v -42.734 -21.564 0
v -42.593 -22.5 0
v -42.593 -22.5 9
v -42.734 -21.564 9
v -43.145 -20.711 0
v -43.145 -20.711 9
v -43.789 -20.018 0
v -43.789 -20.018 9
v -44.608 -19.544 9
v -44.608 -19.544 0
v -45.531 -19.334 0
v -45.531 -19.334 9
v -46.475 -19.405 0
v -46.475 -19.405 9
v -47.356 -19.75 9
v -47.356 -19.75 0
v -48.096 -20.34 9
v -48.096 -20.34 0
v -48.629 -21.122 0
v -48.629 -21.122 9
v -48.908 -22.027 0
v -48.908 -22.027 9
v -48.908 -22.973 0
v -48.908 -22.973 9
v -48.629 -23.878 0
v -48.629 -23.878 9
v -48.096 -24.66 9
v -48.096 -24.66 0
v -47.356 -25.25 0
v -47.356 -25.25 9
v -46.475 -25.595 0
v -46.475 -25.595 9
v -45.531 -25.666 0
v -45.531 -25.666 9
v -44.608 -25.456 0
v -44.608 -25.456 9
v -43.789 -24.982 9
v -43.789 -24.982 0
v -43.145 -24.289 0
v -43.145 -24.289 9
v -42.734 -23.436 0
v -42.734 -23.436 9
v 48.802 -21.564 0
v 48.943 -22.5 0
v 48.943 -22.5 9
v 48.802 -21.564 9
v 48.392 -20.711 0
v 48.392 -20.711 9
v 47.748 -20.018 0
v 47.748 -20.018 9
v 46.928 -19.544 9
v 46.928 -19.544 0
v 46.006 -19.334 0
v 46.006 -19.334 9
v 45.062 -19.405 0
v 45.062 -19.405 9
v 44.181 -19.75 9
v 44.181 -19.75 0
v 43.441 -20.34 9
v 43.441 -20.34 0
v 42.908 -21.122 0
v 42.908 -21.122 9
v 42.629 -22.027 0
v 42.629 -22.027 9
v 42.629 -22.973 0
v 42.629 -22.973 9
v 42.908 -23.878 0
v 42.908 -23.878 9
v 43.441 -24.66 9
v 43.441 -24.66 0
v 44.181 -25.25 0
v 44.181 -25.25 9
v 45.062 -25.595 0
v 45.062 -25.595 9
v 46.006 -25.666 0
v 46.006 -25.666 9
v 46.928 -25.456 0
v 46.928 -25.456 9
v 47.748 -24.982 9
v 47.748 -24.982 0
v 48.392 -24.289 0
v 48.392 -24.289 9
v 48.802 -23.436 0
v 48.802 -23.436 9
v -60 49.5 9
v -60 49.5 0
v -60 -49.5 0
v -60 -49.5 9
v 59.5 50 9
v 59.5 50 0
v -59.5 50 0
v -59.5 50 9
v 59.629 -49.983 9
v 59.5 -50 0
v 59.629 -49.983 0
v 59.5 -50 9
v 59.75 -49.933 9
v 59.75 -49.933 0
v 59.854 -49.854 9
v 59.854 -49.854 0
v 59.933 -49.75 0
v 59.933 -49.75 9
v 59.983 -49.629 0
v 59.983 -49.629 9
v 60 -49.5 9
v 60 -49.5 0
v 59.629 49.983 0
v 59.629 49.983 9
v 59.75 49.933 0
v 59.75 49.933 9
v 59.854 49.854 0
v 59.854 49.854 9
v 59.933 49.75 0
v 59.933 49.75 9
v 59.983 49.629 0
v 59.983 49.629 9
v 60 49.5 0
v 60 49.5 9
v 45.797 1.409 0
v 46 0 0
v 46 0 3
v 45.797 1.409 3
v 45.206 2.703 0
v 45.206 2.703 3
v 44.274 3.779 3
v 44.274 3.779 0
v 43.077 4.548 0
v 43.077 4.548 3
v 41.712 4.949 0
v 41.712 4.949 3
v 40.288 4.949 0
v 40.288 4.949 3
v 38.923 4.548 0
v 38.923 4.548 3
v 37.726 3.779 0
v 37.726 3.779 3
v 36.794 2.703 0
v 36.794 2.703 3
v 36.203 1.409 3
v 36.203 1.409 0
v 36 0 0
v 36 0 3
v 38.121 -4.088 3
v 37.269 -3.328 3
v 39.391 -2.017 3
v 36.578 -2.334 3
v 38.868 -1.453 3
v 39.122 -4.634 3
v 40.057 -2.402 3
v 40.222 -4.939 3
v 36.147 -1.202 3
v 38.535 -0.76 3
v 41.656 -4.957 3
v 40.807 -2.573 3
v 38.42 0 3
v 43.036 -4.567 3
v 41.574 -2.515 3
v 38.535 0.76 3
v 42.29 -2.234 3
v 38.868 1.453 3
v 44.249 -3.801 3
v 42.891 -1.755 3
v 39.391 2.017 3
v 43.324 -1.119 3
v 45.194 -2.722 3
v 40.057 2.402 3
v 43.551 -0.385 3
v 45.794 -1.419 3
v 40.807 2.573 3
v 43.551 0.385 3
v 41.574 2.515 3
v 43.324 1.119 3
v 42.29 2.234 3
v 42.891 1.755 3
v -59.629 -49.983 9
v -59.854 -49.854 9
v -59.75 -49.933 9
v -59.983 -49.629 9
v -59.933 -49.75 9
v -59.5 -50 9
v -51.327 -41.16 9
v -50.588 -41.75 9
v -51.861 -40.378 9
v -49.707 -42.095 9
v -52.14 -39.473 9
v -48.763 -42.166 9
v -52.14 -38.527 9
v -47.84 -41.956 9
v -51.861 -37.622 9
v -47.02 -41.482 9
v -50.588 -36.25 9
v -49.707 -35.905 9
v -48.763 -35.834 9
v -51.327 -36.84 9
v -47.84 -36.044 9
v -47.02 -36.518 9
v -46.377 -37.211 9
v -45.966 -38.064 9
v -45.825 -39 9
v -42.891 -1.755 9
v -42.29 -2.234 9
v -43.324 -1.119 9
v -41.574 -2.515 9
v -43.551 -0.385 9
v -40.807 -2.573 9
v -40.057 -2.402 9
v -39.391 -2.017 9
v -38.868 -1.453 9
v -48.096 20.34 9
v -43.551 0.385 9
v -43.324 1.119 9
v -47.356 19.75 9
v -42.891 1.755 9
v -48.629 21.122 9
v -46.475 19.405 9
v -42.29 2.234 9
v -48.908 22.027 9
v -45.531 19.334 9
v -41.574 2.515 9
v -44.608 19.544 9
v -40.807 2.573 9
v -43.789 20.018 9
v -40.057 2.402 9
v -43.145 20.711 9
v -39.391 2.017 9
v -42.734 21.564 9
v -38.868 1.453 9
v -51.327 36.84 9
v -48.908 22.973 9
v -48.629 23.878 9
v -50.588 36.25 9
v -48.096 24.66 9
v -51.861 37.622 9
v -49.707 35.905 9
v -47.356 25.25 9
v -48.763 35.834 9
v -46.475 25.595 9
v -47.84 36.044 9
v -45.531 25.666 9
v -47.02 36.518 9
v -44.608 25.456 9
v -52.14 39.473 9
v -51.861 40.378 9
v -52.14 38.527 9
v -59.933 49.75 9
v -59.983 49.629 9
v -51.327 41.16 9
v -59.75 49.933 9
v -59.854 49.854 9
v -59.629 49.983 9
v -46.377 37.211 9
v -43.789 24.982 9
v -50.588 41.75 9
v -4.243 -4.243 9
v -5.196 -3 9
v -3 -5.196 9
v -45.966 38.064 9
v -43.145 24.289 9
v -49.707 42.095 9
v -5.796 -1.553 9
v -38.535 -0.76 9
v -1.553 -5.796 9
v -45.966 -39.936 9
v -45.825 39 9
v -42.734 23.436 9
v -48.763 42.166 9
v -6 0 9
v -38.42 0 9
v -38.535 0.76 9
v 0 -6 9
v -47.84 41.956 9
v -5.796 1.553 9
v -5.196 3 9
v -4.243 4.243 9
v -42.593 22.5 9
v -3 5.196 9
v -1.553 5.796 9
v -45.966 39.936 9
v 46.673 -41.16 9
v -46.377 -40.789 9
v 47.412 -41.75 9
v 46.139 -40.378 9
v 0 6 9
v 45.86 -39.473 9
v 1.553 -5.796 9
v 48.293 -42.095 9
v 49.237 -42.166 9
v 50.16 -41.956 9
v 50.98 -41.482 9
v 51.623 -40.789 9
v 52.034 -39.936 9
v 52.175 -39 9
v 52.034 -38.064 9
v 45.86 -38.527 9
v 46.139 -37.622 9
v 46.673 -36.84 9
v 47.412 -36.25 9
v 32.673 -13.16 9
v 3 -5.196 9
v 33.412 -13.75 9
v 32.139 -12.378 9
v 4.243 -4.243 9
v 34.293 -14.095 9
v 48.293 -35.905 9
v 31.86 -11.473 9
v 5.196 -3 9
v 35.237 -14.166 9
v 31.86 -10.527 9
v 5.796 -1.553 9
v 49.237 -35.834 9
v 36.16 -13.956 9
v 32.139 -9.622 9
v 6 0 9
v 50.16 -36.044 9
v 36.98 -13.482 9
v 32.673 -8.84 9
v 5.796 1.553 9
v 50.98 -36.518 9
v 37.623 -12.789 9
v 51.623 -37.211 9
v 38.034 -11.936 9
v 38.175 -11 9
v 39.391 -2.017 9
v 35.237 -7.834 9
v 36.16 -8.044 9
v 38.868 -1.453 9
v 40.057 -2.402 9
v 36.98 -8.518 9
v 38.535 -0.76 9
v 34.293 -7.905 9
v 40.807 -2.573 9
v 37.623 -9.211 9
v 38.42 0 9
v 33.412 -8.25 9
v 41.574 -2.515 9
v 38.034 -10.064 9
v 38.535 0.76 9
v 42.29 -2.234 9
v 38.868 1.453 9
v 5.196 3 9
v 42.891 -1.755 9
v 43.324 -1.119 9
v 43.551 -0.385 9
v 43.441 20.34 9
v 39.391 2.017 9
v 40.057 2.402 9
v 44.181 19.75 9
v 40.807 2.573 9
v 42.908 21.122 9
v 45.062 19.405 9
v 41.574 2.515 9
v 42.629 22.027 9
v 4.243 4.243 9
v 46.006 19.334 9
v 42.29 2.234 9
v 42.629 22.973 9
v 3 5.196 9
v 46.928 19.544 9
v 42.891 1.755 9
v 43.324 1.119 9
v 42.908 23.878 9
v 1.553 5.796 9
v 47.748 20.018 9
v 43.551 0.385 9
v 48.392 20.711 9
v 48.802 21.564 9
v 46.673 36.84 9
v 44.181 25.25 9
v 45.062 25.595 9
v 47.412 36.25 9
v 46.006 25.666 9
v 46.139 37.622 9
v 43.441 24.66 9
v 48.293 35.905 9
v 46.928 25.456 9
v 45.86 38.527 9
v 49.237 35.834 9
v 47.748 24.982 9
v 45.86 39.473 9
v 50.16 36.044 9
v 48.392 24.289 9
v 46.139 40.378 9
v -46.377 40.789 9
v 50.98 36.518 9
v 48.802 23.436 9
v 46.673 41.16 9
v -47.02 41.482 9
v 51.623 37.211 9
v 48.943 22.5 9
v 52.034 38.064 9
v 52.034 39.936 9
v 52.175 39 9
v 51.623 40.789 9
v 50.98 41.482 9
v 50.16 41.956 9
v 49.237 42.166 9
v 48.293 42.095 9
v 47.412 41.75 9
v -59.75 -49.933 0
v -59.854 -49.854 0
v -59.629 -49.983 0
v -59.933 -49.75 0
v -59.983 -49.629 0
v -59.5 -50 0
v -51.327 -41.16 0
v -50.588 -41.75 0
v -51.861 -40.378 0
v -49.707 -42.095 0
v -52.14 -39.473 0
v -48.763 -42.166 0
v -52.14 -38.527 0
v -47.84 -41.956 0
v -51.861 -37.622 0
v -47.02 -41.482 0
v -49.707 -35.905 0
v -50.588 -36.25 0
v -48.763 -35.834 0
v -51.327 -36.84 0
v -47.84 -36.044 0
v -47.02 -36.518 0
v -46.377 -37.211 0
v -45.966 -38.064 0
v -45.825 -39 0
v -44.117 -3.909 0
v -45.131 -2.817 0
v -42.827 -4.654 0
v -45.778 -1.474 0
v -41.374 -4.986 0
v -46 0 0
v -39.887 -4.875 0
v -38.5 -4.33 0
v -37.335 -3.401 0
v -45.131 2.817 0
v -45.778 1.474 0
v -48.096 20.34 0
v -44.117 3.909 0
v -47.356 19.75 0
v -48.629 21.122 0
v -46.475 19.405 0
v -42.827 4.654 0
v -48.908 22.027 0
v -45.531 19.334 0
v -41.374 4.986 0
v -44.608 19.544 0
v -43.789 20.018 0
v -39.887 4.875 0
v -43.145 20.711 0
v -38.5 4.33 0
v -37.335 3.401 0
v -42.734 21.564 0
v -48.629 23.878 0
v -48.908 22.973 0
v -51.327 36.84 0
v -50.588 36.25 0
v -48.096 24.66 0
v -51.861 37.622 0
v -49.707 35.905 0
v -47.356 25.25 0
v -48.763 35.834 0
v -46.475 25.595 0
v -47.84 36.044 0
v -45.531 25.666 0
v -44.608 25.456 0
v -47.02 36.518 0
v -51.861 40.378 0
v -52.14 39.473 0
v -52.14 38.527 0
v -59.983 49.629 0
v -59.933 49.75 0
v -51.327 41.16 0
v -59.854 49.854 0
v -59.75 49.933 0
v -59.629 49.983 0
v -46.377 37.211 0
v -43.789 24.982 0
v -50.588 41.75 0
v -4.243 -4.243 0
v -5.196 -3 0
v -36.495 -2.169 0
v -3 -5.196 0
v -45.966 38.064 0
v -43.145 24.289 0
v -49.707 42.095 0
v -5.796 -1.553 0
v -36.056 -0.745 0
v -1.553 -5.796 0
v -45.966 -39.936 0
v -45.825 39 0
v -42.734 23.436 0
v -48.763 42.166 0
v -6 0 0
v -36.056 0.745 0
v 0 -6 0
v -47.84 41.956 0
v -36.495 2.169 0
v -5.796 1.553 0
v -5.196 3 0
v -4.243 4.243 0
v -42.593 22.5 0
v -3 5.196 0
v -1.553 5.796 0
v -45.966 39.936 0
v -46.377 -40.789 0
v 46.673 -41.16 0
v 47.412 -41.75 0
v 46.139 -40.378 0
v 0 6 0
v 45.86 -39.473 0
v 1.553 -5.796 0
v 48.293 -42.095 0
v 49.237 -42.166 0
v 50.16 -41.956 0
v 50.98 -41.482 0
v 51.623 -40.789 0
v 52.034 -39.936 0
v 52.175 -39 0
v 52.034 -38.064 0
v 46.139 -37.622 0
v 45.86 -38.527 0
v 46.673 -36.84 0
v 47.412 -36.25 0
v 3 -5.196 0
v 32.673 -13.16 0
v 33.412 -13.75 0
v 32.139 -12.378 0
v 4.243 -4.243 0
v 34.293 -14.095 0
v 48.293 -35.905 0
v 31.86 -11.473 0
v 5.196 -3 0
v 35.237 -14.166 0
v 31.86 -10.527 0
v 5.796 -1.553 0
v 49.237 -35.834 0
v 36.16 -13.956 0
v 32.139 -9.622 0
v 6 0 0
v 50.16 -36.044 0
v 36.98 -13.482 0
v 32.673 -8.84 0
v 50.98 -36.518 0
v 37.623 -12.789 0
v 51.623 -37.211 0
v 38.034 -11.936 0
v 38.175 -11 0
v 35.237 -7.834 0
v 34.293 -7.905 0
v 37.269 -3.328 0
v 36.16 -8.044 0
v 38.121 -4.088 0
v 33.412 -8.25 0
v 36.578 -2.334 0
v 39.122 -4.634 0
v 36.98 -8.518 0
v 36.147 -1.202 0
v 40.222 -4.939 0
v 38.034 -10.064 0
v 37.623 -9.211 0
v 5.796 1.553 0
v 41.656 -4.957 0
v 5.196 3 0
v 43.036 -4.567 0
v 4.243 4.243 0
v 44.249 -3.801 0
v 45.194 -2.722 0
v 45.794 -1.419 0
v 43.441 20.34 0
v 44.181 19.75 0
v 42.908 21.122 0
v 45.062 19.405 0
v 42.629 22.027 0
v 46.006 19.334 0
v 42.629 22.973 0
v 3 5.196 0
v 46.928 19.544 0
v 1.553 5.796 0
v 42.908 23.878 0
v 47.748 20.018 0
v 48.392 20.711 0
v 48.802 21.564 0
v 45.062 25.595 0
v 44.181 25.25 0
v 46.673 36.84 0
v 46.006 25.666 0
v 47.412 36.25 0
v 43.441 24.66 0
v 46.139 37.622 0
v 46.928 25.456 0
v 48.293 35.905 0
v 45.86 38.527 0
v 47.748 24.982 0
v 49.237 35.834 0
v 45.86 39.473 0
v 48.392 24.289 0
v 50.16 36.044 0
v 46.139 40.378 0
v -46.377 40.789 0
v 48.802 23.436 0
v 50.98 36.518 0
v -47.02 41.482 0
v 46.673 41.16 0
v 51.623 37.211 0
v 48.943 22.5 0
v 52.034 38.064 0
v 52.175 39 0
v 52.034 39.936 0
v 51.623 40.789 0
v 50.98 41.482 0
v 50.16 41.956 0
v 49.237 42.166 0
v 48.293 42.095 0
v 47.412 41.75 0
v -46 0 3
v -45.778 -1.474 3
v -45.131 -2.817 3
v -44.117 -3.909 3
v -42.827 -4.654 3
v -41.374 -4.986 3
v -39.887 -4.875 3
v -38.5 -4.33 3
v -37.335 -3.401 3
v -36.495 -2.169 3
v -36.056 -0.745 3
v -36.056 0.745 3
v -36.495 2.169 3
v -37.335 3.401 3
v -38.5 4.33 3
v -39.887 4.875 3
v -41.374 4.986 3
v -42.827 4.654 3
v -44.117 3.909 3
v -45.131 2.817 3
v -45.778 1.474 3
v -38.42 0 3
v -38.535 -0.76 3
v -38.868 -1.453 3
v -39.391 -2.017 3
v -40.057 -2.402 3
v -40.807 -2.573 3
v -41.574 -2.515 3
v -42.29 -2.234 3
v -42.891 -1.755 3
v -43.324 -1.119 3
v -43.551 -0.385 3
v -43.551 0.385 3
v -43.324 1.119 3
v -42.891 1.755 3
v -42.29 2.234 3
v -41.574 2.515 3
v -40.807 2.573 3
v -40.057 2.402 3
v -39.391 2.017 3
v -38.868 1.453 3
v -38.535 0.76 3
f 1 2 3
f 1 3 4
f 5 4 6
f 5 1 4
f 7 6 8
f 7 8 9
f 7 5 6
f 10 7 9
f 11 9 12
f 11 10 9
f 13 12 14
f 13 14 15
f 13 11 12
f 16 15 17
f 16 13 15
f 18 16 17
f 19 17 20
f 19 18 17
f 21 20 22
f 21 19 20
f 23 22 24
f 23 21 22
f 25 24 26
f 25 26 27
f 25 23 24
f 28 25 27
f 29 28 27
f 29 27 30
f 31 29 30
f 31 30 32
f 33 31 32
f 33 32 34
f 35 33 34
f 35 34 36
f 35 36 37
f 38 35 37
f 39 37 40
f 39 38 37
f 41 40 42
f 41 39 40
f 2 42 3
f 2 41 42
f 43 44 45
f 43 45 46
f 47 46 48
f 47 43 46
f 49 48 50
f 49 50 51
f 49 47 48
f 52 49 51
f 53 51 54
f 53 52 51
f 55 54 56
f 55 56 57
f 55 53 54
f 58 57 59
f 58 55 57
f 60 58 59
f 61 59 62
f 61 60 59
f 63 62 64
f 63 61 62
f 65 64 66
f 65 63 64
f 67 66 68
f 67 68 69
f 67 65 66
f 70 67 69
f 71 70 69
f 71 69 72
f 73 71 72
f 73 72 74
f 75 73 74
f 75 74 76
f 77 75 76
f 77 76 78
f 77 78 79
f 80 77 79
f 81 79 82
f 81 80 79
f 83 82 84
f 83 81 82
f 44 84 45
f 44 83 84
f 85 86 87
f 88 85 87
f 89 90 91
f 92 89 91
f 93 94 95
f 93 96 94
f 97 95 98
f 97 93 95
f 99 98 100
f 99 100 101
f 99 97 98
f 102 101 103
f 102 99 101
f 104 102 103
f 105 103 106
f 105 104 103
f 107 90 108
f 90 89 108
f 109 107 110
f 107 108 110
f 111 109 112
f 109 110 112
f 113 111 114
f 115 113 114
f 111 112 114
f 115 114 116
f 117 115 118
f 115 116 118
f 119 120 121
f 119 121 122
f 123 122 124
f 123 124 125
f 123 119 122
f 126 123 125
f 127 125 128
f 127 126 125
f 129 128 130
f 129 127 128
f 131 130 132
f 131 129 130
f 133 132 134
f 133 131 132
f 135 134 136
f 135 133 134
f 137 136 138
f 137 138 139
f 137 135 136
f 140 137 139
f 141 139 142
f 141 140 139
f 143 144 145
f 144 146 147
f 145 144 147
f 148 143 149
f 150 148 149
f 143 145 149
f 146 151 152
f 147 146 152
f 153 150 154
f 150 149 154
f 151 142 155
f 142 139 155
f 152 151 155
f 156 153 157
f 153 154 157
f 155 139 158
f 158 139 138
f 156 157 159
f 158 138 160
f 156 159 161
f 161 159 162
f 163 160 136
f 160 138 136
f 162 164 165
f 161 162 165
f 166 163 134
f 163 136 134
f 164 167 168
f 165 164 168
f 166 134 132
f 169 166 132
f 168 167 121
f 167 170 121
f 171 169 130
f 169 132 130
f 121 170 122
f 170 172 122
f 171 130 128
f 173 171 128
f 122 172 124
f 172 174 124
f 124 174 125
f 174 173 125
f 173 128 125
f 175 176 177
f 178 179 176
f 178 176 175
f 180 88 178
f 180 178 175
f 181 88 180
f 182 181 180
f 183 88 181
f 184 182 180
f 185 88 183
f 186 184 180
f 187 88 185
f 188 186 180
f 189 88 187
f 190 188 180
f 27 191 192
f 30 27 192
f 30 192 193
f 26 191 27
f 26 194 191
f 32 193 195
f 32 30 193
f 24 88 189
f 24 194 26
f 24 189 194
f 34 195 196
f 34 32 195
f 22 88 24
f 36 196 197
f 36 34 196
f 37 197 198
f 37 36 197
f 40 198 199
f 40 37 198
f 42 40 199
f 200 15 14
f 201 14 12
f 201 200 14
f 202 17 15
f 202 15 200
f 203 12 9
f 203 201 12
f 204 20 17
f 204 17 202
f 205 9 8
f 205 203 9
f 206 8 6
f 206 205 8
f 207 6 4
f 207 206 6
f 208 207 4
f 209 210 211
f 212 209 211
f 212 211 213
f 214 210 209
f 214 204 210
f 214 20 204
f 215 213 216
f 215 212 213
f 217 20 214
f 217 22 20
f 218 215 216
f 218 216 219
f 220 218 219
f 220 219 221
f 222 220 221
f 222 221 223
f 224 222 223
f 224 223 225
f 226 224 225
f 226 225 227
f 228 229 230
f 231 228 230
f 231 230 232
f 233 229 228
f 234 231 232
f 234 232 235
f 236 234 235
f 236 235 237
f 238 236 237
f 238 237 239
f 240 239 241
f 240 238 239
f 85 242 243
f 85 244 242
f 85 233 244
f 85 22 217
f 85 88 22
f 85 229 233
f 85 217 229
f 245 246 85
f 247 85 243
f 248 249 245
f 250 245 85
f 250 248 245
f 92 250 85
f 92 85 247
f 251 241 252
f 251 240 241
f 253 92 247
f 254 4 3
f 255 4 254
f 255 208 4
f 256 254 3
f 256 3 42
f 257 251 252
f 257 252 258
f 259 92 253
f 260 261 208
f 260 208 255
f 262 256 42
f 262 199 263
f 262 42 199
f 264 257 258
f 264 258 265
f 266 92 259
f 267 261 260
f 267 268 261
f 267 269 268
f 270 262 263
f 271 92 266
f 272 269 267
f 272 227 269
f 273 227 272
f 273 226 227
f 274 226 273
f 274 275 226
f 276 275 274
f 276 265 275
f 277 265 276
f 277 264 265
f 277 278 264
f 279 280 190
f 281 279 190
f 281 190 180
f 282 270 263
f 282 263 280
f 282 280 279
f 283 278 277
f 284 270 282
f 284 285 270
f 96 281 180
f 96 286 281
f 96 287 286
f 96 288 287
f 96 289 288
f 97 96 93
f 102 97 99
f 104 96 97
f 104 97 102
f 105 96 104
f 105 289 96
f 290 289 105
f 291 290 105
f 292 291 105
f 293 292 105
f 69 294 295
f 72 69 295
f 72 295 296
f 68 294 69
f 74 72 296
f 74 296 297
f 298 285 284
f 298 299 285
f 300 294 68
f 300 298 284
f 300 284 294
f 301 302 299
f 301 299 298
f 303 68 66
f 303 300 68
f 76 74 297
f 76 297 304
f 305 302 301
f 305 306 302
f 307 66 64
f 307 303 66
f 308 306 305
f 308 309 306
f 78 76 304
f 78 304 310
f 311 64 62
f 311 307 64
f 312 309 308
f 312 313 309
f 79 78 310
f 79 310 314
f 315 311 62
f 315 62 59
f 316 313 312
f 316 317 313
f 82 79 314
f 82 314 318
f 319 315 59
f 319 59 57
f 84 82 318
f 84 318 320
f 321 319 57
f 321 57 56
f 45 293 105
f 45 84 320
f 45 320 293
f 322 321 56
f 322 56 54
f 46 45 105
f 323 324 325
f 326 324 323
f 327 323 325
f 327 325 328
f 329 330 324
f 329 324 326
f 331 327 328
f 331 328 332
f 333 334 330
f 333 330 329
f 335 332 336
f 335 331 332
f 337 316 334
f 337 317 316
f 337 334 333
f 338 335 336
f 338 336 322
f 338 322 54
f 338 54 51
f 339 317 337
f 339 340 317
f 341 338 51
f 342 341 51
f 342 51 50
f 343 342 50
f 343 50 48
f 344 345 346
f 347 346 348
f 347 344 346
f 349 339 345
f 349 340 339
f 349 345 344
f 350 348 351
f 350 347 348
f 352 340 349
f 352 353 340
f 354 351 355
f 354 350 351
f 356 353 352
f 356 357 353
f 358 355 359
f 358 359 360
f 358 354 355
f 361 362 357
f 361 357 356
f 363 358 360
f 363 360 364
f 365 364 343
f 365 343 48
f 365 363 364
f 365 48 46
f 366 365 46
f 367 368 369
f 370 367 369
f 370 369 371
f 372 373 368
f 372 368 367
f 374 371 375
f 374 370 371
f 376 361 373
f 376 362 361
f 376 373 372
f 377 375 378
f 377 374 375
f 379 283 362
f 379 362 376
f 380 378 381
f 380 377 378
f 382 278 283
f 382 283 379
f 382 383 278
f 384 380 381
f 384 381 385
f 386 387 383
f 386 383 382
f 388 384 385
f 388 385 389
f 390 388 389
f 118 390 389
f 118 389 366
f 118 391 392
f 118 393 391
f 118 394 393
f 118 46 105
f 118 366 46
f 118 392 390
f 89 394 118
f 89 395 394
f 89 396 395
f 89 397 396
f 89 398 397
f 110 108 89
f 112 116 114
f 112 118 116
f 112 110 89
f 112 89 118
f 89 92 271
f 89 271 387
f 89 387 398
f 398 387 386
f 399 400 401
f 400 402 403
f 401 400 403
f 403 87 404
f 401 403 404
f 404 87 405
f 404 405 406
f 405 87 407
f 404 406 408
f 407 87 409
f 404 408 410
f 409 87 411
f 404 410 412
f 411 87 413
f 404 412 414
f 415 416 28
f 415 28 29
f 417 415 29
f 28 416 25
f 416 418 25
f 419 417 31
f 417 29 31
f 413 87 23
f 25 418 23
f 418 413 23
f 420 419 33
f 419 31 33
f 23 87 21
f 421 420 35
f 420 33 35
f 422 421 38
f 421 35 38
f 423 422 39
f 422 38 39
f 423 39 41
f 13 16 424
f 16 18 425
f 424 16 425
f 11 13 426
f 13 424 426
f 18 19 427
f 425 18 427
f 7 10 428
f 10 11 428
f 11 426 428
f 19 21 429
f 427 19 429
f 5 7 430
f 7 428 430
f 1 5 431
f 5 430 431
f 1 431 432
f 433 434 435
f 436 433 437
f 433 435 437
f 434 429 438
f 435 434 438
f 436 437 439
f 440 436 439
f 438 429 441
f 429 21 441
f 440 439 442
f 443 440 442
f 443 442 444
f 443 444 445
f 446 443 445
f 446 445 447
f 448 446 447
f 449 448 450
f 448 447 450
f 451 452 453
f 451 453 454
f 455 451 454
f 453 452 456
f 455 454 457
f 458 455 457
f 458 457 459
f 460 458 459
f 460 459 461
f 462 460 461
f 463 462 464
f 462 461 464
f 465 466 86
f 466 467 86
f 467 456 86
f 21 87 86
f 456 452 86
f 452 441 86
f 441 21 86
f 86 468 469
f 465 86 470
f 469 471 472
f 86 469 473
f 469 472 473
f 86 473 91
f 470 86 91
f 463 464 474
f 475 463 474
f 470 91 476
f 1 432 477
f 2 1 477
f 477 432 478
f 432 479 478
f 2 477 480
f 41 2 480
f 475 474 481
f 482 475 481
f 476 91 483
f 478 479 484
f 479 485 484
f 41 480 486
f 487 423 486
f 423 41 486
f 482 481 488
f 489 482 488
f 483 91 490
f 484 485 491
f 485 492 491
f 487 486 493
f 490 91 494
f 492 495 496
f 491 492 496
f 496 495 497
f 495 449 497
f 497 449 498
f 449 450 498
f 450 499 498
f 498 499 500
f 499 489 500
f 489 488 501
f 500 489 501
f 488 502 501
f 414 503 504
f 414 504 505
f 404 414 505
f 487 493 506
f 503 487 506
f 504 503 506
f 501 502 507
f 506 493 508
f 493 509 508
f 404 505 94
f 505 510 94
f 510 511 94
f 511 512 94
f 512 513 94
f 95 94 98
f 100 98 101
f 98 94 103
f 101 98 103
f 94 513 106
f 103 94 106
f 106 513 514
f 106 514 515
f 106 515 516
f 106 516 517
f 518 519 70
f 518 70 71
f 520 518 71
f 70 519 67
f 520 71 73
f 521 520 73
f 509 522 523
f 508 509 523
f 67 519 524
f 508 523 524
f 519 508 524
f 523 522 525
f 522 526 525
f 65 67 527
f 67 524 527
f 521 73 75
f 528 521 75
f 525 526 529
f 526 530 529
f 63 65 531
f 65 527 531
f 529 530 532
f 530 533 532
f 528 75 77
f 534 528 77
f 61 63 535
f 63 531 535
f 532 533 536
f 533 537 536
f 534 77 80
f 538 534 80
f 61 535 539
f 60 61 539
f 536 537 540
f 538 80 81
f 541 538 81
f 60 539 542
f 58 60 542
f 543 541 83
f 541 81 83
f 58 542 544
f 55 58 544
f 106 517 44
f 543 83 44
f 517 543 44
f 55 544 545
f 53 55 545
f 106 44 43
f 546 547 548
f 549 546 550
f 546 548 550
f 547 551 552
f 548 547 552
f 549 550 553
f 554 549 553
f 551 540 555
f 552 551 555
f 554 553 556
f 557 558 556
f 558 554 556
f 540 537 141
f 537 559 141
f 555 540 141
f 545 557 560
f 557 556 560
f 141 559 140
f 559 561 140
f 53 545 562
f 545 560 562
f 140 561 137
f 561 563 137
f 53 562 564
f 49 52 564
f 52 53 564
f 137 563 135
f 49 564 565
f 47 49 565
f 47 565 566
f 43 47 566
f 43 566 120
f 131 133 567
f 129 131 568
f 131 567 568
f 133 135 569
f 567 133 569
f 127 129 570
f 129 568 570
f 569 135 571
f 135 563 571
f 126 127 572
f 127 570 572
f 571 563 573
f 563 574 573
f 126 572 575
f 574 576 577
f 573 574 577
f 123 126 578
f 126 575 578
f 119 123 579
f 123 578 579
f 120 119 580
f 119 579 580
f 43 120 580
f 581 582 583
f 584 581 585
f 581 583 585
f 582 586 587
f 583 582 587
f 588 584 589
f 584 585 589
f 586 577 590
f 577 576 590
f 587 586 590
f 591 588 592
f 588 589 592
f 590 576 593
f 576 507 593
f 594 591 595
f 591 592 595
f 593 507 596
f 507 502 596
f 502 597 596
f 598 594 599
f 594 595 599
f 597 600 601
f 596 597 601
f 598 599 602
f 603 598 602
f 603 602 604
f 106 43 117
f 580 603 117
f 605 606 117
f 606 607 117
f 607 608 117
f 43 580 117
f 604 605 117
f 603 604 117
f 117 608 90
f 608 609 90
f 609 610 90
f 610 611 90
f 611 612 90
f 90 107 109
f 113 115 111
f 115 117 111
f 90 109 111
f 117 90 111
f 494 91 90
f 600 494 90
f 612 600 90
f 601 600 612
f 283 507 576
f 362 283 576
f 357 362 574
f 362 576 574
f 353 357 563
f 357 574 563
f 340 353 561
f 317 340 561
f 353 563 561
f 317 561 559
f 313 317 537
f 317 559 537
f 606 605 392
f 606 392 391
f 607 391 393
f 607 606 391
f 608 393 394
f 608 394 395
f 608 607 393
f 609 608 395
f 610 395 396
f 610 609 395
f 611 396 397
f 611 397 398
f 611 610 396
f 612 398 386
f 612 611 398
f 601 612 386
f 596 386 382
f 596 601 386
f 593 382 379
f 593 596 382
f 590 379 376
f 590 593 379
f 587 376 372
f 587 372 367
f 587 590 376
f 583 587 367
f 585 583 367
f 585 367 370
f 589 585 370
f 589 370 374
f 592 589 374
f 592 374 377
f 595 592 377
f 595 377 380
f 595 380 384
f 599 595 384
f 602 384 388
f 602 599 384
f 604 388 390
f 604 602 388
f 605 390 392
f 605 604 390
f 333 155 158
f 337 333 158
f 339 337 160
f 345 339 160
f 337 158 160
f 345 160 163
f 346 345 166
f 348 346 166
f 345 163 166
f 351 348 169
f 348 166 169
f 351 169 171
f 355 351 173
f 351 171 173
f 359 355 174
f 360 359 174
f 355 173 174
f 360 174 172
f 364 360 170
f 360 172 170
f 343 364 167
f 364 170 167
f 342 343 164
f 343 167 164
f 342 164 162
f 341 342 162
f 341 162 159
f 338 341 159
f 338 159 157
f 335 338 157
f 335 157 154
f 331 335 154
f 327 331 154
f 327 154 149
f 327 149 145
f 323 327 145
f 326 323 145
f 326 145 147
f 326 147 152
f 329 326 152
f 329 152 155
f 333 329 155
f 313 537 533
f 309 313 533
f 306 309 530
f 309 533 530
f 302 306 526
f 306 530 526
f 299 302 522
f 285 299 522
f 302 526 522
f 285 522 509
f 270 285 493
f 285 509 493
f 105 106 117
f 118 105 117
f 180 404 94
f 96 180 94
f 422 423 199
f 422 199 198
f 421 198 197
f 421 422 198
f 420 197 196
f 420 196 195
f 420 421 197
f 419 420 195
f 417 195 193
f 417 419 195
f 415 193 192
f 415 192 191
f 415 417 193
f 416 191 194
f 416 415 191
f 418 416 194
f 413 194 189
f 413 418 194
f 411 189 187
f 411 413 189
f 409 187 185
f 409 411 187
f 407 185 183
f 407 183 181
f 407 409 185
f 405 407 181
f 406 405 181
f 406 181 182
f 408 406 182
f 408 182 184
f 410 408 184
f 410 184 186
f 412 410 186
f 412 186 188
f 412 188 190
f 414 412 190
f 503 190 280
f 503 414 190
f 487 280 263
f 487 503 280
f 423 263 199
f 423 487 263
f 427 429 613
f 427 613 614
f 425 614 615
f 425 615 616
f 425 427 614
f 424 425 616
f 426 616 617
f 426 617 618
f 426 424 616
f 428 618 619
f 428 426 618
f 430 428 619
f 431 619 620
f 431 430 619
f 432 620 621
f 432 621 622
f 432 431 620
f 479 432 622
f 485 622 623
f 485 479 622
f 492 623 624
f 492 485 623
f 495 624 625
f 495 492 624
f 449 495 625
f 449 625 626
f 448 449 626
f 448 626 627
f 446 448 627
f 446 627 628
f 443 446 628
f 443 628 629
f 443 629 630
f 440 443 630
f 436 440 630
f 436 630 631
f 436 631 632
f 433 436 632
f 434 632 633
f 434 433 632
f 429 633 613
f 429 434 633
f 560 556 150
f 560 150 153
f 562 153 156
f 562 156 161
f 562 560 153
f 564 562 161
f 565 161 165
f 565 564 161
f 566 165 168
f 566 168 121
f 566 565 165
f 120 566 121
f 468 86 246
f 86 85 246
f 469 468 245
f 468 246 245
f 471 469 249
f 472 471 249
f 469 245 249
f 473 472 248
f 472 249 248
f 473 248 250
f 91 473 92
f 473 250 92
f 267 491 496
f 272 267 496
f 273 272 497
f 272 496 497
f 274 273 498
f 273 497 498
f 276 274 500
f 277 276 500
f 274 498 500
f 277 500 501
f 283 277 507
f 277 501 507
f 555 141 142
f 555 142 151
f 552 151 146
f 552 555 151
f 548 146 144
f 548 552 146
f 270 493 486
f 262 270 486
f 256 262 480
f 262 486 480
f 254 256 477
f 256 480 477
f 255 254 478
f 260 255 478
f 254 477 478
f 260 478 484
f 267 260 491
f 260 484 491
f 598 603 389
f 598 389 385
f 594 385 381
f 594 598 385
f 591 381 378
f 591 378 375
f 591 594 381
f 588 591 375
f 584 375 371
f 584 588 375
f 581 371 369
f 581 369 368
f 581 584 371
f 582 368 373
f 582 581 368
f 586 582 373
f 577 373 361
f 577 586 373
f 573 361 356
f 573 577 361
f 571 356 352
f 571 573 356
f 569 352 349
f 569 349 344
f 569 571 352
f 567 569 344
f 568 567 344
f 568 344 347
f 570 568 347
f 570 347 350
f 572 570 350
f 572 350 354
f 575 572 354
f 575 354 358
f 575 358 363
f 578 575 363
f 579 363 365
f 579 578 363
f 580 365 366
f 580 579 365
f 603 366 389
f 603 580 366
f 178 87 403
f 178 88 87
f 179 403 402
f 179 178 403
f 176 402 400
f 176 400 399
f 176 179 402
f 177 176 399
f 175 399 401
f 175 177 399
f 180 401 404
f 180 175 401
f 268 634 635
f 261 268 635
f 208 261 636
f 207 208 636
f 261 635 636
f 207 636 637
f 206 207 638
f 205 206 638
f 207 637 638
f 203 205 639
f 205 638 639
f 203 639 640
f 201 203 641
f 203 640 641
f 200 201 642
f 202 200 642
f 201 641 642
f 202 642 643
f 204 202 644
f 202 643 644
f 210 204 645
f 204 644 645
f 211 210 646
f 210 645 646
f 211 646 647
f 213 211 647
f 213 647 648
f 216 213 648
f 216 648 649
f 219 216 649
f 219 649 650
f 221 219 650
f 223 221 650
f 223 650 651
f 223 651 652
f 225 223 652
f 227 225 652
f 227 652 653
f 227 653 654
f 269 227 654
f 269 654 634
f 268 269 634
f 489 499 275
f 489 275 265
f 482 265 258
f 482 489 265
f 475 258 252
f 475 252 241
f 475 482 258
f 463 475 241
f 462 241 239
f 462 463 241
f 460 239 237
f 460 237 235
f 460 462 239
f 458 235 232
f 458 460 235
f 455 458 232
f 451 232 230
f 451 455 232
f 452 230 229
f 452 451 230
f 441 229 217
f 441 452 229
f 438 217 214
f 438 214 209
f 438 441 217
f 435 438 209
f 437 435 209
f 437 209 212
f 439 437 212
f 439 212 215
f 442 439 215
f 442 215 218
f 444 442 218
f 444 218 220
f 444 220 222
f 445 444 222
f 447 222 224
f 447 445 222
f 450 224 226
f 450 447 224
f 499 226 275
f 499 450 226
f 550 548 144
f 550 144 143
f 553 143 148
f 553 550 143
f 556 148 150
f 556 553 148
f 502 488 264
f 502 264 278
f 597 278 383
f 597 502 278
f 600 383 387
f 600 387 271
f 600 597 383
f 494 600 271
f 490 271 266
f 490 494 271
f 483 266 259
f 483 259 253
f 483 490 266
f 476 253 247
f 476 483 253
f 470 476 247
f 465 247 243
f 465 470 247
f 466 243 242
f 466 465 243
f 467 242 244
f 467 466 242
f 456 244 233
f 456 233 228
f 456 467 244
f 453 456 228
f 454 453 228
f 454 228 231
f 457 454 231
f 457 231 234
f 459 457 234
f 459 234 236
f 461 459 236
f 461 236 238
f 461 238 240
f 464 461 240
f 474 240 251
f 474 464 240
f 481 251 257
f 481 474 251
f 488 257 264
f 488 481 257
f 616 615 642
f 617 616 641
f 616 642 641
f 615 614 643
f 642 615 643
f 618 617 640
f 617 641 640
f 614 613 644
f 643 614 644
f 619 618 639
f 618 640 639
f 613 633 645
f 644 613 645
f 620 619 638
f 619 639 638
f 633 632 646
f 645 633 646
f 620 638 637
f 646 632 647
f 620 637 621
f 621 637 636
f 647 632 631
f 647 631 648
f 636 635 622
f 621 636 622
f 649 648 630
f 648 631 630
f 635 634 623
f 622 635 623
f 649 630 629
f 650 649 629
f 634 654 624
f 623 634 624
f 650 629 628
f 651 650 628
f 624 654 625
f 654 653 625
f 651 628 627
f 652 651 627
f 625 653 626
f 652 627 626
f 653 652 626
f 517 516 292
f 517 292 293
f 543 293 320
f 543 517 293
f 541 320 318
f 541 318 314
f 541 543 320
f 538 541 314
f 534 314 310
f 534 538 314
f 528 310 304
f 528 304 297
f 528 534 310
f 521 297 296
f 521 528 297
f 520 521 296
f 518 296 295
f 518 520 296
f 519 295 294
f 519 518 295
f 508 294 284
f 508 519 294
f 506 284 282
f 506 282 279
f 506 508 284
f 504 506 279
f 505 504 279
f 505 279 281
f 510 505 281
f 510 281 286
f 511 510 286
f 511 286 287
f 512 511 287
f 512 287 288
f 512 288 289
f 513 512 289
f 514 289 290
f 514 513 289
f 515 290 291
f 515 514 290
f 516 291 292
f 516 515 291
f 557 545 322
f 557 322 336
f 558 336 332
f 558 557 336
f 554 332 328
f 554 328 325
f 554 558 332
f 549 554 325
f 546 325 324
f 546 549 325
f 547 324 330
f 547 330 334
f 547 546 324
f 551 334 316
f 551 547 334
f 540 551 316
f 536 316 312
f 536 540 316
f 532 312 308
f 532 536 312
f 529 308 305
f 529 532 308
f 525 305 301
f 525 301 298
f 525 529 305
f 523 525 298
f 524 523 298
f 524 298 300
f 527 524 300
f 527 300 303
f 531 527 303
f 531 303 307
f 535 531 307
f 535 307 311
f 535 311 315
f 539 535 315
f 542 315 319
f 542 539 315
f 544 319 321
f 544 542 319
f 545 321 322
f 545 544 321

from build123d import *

# Parameters (mm, degrees)
F0_R     = 3.175
F1_DEPTH = 9
F2_DEPTH = 3
F4_R     = 0.5


with BuildPart() as f1:
    # F0 (on Top) → F1 (new body)
    with BuildSketch(Plane.XY):
        with BuildLine():
            Line((0, 17.5), (0, 50))
            Line((0, 50), (-60, 50))
            Line((-60, 50), (-60, 0))
            Line((-60, 0), (-46, 0))
            ThreePointArc((-46, 0), (-41, 5), (-36, 0))
            Line((-36, 0), (-17.5, 0))
            ThreePointArc((-17.5, 0), (-12.3743686708, 12.3743686708), (0, 17.5))
        make_face()
        with Locations((-45.768439, 22.5)):
            Circle(F0_R, mode=Mode.SUBTRACT)
        with Locations((-49, 39)):
            Circle(F0_R, mode=Mode.SUBTRACT)
        with BuildLine():
            Line((60, 50), (0, 50))
            Line((0, 50), (0, 17.5))
            ThreePointArc((0, 17.5), (12.3743686708, 12.3743686708), (17.5, 0))
            Line((17.5, 0), (36, 0))
            ThreePointArc((36, 0), (41, 5), (46, 0))
            Line((46, 0), (60, 0))
            Line((60, 0), (60, 50))
        make_face()
        with Locations((45.768439, 22.5)):
            Circle(F0_R, mode=Mode.SUBTRACT)
        with Locations((49, 39)):
            Circle(F0_R, mode=Mode.SUBTRACT)
        with BuildLine():
            Line((36, 0), (17.5, 0))
            ThreePointArc((17.5, 0), (12.3743686708, -12.3743686708), (0, -17.5))
            Line((0, -17.5), (0, -50))
            Line((0, -50), (60, -50))
            Line((60, -50), (60, 0))
            Line((60, 0), (46, 0))
            ThreePointArc((46, 0), (44.2486753365, -3.8008036726), (40.2215565768, -4.9390308601))
            ThreePointArc((40.2215565768, -4.9390308601), (42.2722916819, -7.6662673034), (43, -11))
            ThreePointArc((43, -11), (28.5909784575, -15.7879476676), (37.268889283, -3.3284850635))
            ThreePointArc((37.268889283, -3.3284850635), (36.3279793673, -1.7810736109), (36, 0))
        make_face()
        with Locations((49, -39)):
            Circle(F0_R, mode=Mode.SUBTRACT)
        with Locations((45.768439, -22.5)):
            Circle(F0_R, mode=Mode.SUBTRACT)
        with BuildLine():
            ThreePointArc((0, -17.5), (-12.3743686708, -12.3743686708), (-17.5, 0))
            Line((-17.5, 0), (-36, 0))
            ThreePointArc((-36, 0), (-41, -5), (-46, 0))
            Line((-46, 0), (-60, 0))
            Line((-60, 0), (-60, -50))
            Line((-60, -50), (0, -50))
            Line((0, -50), (0, -17.5))
        make_face()
        with Locations((-49, -39)):
            Circle(F0_R, mode=Mode.SUBTRACT)
        with Locations((-45.768439, -22.5)):
            Circle(F0_R, mode=Mode.SUBTRACT)
        with BuildLine():
            ThreePointArc((40.2215565768, -4.9390308601), (38.6057393466, -4.3894778646), (37.268889283, -3.3284850635))
            ThreePointArc((37.268889283, -3.3284850635), (28.5909784575, -15.7879476676), (43, -11))
            ThreePointArc((43, -11), (42.2722916819, -7.6662673034), (40.2215565768, -4.9390308601))
        make_face()
        with Locations((35, -11)):
            Circle(F0_R, mode=Mode.SUBTRACT)
        with BuildLine():
            Line((38.42, 0), (36, 0))
            ThreePointArc((36, 0), (36.3279793673, -1.7810736109), (37.268889283, -3.3284850635))
            ThreePointArc((37.268889283, -3.3284850635), (38.8308170454, -3.9768354167), (40.2215565768, -4.9390308601))
            ThreePointArc((40.2215565768, -4.9390308601), (44.2486753365, -3.8008036726), (46, 0))
            Line((46, 0), (43.58, 0))
            ThreePointArc((43.58, 0), (41, -2.58), (38.42, 0))
        make_face()
        with BuildLine():
            ThreePointArc((46, 0), (41, 5), (36, 0))
            Line((36, 0), (38.42, 0))
            ThreePointArc((38.42, 0), (41, 2.58), (43.58, 0))
            Line((43.58, 0), (46, 0))
        make_face()
        with BuildLine():
            Line((-38.42, 0), (-36, 0))
            ThreePointArc((-36, 0), (-41, 5), (-46, 0))
            Line((-46, 0), (-43.58, 0))
            ThreePointArc((-43.58, 0), (-41, 2.58), (-38.42, 0))
        make_face()
        with BuildLine():
            ThreePointArc((-46, 0), (-41, -5), (-36, 0))
            Line((-36, 0), (-38.42, 0))
            ThreePointArc((-38.42, 0), (-41, -2.58), (-43.58, 0))
            Line((-43.58, 0), (-46, 0))
        make_face()
        with BuildLine():
            ThreePointArc((40.2215565768, -4.9390308601), (38.8308170454, -3.9768354167), (37.268889283, -3.3284850635))
            ThreePointArc((37.268889283, -3.3284850635), (38.6057393466, -4.3894778646), (40.2215565768, -4.9390308601))
        make_face()
        with BuildLine():
            Line((0, 6), (0, 17.5))
            ThreePointArc((0, 17.5), (-12.3743686708, 12.3743686708), (-17.5, 0))
            Line((-17.5, 0), (-6, 0))
            ThreePointArc((-6, 0), (-4.2426406871, 4.2426406871), (0, 6))
        make_face()
        with BuildLine():
            ThreePointArc((17.5, 0), (12.3743686708, 12.3743686708), (0, 17.5))
            Line((0, 17.5), (0, 6))
            ThreePointArc((0, 6), (4.2426406871, 4.2426406871), (6, 0))
            Line((6, 0), (17.5, 0))
        make_face()
        with BuildLine():
            ThreePointArc((0, -17.5), (12.3743686708, -12.3743686708), (17.5, 0))
            Line((17.5, 0), (6, 0))
            ThreePointArc((6, 0), (4.2426406871, -4.2426406871), (0, -6))
            Line((0, -6), (0, -17.5))
        make_face()
        with BuildLine():
            Line((-6, 0), (-17.5, 0))
            ThreePointArc((-17.5, 0), (-12.3743686708, -12.3743686708), (0, -17.5))
            Line((0, -17.5), (0, -6))
            ThreePointArc((0, -6), (-4.2426406871, -4.2426406871), (-6, 0))
        make_face()
    extrude(amount=F1_DEPTH)


with BuildPart() as f2:
    # F0 (on Top) → F2 (new body)
    with BuildSketch(Plane.XY):
        with BuildLine():
            Line((38.42, 0), (36, 0))
            ThreePointArc((36, 0), (36.3279793673, -1.7810736109), (37.268889283, -3.3284850635))
            ThreePointArc((37.268889283, -3.3284850635), (38.8308170454, -3.9768354167), (40.2215565768, -4.9390308601))
            ThreePointArc((40.2215565768, -4.9390308601), (44.2486753365, -3.8008036726), (46, 0))
            Line((46, 0), (43.58, 0))
            ThreePointArc((43.58, 0), (41, -2.58), (38.42, 0))
        make_face()
        with BuildLine():
            ThreePointArc((46, 0), (41, 5), (36, 0))
            Line((36, 0), (38.42, 0))
            ThreePointArc((38.42, 0), (41, 2.58), (43.58, 0))
            Line((43.58, 0), (46, 0))
        make_face()
        with BuildLine():
            ThreePointArc((40.2215565768, -4.9390308601), (38.8308170454, -3.9768354167), (37.268889283, -3.3284850635))
            ThreePointArc((37.268889283, -3.3284850635), (38.6057393466, -4.3894778646), (40.2215565768, -4.9390308601))
        make_face()
    extrude(amount=F2_DEPTH)


with BuildPart() as f2b:
    # F0 (on Top) → F2, piece 2 (new body)
    with BuildSketch(Plane.XY):
        with BuildLine():
            Line((-38.42, 0), (-36, 0))
            ThreePointArc((-36, 0), (-41, 5), (-46, 0))
            Line((-46, 0), (-43.58, 0))
            ThreePointArc((-43.58, 0), (-41, 2.58), (-38.42, 0))
        make_face()
        with BuildLine():
            ThreePointArc((-46, 0), (-41, -5), (-36, 0))
            Line((-36, 0), (-38.42, 0))
            ThreePointArc((-38.42, 0), (-41, -2.58), (-43.58, 0))
            Line((-43.58, 0), (-46, 0))
        make_face()
    extrude(amount=F2_DEPTH)


with BuildPart() as f1_1:
    add(f1.part)

    # F3: cut F2b, F2
    add(f2b.part, mode=Mode.SUBTRACT)
    add(f2.part, mode=Mode.SUBTRACT)

    # F4
    f4_edges = [f1_1.edges().sort_by_distance(p)[0] for p in [
        (60, 50, 4.5),
        (60, -50, 4.5),
        (-60, 50, 4.5),
        (-60, -50, 4.5),
    ]]
    fillet(f4_edges, radius=F4_R)


solid = f1_1.part
